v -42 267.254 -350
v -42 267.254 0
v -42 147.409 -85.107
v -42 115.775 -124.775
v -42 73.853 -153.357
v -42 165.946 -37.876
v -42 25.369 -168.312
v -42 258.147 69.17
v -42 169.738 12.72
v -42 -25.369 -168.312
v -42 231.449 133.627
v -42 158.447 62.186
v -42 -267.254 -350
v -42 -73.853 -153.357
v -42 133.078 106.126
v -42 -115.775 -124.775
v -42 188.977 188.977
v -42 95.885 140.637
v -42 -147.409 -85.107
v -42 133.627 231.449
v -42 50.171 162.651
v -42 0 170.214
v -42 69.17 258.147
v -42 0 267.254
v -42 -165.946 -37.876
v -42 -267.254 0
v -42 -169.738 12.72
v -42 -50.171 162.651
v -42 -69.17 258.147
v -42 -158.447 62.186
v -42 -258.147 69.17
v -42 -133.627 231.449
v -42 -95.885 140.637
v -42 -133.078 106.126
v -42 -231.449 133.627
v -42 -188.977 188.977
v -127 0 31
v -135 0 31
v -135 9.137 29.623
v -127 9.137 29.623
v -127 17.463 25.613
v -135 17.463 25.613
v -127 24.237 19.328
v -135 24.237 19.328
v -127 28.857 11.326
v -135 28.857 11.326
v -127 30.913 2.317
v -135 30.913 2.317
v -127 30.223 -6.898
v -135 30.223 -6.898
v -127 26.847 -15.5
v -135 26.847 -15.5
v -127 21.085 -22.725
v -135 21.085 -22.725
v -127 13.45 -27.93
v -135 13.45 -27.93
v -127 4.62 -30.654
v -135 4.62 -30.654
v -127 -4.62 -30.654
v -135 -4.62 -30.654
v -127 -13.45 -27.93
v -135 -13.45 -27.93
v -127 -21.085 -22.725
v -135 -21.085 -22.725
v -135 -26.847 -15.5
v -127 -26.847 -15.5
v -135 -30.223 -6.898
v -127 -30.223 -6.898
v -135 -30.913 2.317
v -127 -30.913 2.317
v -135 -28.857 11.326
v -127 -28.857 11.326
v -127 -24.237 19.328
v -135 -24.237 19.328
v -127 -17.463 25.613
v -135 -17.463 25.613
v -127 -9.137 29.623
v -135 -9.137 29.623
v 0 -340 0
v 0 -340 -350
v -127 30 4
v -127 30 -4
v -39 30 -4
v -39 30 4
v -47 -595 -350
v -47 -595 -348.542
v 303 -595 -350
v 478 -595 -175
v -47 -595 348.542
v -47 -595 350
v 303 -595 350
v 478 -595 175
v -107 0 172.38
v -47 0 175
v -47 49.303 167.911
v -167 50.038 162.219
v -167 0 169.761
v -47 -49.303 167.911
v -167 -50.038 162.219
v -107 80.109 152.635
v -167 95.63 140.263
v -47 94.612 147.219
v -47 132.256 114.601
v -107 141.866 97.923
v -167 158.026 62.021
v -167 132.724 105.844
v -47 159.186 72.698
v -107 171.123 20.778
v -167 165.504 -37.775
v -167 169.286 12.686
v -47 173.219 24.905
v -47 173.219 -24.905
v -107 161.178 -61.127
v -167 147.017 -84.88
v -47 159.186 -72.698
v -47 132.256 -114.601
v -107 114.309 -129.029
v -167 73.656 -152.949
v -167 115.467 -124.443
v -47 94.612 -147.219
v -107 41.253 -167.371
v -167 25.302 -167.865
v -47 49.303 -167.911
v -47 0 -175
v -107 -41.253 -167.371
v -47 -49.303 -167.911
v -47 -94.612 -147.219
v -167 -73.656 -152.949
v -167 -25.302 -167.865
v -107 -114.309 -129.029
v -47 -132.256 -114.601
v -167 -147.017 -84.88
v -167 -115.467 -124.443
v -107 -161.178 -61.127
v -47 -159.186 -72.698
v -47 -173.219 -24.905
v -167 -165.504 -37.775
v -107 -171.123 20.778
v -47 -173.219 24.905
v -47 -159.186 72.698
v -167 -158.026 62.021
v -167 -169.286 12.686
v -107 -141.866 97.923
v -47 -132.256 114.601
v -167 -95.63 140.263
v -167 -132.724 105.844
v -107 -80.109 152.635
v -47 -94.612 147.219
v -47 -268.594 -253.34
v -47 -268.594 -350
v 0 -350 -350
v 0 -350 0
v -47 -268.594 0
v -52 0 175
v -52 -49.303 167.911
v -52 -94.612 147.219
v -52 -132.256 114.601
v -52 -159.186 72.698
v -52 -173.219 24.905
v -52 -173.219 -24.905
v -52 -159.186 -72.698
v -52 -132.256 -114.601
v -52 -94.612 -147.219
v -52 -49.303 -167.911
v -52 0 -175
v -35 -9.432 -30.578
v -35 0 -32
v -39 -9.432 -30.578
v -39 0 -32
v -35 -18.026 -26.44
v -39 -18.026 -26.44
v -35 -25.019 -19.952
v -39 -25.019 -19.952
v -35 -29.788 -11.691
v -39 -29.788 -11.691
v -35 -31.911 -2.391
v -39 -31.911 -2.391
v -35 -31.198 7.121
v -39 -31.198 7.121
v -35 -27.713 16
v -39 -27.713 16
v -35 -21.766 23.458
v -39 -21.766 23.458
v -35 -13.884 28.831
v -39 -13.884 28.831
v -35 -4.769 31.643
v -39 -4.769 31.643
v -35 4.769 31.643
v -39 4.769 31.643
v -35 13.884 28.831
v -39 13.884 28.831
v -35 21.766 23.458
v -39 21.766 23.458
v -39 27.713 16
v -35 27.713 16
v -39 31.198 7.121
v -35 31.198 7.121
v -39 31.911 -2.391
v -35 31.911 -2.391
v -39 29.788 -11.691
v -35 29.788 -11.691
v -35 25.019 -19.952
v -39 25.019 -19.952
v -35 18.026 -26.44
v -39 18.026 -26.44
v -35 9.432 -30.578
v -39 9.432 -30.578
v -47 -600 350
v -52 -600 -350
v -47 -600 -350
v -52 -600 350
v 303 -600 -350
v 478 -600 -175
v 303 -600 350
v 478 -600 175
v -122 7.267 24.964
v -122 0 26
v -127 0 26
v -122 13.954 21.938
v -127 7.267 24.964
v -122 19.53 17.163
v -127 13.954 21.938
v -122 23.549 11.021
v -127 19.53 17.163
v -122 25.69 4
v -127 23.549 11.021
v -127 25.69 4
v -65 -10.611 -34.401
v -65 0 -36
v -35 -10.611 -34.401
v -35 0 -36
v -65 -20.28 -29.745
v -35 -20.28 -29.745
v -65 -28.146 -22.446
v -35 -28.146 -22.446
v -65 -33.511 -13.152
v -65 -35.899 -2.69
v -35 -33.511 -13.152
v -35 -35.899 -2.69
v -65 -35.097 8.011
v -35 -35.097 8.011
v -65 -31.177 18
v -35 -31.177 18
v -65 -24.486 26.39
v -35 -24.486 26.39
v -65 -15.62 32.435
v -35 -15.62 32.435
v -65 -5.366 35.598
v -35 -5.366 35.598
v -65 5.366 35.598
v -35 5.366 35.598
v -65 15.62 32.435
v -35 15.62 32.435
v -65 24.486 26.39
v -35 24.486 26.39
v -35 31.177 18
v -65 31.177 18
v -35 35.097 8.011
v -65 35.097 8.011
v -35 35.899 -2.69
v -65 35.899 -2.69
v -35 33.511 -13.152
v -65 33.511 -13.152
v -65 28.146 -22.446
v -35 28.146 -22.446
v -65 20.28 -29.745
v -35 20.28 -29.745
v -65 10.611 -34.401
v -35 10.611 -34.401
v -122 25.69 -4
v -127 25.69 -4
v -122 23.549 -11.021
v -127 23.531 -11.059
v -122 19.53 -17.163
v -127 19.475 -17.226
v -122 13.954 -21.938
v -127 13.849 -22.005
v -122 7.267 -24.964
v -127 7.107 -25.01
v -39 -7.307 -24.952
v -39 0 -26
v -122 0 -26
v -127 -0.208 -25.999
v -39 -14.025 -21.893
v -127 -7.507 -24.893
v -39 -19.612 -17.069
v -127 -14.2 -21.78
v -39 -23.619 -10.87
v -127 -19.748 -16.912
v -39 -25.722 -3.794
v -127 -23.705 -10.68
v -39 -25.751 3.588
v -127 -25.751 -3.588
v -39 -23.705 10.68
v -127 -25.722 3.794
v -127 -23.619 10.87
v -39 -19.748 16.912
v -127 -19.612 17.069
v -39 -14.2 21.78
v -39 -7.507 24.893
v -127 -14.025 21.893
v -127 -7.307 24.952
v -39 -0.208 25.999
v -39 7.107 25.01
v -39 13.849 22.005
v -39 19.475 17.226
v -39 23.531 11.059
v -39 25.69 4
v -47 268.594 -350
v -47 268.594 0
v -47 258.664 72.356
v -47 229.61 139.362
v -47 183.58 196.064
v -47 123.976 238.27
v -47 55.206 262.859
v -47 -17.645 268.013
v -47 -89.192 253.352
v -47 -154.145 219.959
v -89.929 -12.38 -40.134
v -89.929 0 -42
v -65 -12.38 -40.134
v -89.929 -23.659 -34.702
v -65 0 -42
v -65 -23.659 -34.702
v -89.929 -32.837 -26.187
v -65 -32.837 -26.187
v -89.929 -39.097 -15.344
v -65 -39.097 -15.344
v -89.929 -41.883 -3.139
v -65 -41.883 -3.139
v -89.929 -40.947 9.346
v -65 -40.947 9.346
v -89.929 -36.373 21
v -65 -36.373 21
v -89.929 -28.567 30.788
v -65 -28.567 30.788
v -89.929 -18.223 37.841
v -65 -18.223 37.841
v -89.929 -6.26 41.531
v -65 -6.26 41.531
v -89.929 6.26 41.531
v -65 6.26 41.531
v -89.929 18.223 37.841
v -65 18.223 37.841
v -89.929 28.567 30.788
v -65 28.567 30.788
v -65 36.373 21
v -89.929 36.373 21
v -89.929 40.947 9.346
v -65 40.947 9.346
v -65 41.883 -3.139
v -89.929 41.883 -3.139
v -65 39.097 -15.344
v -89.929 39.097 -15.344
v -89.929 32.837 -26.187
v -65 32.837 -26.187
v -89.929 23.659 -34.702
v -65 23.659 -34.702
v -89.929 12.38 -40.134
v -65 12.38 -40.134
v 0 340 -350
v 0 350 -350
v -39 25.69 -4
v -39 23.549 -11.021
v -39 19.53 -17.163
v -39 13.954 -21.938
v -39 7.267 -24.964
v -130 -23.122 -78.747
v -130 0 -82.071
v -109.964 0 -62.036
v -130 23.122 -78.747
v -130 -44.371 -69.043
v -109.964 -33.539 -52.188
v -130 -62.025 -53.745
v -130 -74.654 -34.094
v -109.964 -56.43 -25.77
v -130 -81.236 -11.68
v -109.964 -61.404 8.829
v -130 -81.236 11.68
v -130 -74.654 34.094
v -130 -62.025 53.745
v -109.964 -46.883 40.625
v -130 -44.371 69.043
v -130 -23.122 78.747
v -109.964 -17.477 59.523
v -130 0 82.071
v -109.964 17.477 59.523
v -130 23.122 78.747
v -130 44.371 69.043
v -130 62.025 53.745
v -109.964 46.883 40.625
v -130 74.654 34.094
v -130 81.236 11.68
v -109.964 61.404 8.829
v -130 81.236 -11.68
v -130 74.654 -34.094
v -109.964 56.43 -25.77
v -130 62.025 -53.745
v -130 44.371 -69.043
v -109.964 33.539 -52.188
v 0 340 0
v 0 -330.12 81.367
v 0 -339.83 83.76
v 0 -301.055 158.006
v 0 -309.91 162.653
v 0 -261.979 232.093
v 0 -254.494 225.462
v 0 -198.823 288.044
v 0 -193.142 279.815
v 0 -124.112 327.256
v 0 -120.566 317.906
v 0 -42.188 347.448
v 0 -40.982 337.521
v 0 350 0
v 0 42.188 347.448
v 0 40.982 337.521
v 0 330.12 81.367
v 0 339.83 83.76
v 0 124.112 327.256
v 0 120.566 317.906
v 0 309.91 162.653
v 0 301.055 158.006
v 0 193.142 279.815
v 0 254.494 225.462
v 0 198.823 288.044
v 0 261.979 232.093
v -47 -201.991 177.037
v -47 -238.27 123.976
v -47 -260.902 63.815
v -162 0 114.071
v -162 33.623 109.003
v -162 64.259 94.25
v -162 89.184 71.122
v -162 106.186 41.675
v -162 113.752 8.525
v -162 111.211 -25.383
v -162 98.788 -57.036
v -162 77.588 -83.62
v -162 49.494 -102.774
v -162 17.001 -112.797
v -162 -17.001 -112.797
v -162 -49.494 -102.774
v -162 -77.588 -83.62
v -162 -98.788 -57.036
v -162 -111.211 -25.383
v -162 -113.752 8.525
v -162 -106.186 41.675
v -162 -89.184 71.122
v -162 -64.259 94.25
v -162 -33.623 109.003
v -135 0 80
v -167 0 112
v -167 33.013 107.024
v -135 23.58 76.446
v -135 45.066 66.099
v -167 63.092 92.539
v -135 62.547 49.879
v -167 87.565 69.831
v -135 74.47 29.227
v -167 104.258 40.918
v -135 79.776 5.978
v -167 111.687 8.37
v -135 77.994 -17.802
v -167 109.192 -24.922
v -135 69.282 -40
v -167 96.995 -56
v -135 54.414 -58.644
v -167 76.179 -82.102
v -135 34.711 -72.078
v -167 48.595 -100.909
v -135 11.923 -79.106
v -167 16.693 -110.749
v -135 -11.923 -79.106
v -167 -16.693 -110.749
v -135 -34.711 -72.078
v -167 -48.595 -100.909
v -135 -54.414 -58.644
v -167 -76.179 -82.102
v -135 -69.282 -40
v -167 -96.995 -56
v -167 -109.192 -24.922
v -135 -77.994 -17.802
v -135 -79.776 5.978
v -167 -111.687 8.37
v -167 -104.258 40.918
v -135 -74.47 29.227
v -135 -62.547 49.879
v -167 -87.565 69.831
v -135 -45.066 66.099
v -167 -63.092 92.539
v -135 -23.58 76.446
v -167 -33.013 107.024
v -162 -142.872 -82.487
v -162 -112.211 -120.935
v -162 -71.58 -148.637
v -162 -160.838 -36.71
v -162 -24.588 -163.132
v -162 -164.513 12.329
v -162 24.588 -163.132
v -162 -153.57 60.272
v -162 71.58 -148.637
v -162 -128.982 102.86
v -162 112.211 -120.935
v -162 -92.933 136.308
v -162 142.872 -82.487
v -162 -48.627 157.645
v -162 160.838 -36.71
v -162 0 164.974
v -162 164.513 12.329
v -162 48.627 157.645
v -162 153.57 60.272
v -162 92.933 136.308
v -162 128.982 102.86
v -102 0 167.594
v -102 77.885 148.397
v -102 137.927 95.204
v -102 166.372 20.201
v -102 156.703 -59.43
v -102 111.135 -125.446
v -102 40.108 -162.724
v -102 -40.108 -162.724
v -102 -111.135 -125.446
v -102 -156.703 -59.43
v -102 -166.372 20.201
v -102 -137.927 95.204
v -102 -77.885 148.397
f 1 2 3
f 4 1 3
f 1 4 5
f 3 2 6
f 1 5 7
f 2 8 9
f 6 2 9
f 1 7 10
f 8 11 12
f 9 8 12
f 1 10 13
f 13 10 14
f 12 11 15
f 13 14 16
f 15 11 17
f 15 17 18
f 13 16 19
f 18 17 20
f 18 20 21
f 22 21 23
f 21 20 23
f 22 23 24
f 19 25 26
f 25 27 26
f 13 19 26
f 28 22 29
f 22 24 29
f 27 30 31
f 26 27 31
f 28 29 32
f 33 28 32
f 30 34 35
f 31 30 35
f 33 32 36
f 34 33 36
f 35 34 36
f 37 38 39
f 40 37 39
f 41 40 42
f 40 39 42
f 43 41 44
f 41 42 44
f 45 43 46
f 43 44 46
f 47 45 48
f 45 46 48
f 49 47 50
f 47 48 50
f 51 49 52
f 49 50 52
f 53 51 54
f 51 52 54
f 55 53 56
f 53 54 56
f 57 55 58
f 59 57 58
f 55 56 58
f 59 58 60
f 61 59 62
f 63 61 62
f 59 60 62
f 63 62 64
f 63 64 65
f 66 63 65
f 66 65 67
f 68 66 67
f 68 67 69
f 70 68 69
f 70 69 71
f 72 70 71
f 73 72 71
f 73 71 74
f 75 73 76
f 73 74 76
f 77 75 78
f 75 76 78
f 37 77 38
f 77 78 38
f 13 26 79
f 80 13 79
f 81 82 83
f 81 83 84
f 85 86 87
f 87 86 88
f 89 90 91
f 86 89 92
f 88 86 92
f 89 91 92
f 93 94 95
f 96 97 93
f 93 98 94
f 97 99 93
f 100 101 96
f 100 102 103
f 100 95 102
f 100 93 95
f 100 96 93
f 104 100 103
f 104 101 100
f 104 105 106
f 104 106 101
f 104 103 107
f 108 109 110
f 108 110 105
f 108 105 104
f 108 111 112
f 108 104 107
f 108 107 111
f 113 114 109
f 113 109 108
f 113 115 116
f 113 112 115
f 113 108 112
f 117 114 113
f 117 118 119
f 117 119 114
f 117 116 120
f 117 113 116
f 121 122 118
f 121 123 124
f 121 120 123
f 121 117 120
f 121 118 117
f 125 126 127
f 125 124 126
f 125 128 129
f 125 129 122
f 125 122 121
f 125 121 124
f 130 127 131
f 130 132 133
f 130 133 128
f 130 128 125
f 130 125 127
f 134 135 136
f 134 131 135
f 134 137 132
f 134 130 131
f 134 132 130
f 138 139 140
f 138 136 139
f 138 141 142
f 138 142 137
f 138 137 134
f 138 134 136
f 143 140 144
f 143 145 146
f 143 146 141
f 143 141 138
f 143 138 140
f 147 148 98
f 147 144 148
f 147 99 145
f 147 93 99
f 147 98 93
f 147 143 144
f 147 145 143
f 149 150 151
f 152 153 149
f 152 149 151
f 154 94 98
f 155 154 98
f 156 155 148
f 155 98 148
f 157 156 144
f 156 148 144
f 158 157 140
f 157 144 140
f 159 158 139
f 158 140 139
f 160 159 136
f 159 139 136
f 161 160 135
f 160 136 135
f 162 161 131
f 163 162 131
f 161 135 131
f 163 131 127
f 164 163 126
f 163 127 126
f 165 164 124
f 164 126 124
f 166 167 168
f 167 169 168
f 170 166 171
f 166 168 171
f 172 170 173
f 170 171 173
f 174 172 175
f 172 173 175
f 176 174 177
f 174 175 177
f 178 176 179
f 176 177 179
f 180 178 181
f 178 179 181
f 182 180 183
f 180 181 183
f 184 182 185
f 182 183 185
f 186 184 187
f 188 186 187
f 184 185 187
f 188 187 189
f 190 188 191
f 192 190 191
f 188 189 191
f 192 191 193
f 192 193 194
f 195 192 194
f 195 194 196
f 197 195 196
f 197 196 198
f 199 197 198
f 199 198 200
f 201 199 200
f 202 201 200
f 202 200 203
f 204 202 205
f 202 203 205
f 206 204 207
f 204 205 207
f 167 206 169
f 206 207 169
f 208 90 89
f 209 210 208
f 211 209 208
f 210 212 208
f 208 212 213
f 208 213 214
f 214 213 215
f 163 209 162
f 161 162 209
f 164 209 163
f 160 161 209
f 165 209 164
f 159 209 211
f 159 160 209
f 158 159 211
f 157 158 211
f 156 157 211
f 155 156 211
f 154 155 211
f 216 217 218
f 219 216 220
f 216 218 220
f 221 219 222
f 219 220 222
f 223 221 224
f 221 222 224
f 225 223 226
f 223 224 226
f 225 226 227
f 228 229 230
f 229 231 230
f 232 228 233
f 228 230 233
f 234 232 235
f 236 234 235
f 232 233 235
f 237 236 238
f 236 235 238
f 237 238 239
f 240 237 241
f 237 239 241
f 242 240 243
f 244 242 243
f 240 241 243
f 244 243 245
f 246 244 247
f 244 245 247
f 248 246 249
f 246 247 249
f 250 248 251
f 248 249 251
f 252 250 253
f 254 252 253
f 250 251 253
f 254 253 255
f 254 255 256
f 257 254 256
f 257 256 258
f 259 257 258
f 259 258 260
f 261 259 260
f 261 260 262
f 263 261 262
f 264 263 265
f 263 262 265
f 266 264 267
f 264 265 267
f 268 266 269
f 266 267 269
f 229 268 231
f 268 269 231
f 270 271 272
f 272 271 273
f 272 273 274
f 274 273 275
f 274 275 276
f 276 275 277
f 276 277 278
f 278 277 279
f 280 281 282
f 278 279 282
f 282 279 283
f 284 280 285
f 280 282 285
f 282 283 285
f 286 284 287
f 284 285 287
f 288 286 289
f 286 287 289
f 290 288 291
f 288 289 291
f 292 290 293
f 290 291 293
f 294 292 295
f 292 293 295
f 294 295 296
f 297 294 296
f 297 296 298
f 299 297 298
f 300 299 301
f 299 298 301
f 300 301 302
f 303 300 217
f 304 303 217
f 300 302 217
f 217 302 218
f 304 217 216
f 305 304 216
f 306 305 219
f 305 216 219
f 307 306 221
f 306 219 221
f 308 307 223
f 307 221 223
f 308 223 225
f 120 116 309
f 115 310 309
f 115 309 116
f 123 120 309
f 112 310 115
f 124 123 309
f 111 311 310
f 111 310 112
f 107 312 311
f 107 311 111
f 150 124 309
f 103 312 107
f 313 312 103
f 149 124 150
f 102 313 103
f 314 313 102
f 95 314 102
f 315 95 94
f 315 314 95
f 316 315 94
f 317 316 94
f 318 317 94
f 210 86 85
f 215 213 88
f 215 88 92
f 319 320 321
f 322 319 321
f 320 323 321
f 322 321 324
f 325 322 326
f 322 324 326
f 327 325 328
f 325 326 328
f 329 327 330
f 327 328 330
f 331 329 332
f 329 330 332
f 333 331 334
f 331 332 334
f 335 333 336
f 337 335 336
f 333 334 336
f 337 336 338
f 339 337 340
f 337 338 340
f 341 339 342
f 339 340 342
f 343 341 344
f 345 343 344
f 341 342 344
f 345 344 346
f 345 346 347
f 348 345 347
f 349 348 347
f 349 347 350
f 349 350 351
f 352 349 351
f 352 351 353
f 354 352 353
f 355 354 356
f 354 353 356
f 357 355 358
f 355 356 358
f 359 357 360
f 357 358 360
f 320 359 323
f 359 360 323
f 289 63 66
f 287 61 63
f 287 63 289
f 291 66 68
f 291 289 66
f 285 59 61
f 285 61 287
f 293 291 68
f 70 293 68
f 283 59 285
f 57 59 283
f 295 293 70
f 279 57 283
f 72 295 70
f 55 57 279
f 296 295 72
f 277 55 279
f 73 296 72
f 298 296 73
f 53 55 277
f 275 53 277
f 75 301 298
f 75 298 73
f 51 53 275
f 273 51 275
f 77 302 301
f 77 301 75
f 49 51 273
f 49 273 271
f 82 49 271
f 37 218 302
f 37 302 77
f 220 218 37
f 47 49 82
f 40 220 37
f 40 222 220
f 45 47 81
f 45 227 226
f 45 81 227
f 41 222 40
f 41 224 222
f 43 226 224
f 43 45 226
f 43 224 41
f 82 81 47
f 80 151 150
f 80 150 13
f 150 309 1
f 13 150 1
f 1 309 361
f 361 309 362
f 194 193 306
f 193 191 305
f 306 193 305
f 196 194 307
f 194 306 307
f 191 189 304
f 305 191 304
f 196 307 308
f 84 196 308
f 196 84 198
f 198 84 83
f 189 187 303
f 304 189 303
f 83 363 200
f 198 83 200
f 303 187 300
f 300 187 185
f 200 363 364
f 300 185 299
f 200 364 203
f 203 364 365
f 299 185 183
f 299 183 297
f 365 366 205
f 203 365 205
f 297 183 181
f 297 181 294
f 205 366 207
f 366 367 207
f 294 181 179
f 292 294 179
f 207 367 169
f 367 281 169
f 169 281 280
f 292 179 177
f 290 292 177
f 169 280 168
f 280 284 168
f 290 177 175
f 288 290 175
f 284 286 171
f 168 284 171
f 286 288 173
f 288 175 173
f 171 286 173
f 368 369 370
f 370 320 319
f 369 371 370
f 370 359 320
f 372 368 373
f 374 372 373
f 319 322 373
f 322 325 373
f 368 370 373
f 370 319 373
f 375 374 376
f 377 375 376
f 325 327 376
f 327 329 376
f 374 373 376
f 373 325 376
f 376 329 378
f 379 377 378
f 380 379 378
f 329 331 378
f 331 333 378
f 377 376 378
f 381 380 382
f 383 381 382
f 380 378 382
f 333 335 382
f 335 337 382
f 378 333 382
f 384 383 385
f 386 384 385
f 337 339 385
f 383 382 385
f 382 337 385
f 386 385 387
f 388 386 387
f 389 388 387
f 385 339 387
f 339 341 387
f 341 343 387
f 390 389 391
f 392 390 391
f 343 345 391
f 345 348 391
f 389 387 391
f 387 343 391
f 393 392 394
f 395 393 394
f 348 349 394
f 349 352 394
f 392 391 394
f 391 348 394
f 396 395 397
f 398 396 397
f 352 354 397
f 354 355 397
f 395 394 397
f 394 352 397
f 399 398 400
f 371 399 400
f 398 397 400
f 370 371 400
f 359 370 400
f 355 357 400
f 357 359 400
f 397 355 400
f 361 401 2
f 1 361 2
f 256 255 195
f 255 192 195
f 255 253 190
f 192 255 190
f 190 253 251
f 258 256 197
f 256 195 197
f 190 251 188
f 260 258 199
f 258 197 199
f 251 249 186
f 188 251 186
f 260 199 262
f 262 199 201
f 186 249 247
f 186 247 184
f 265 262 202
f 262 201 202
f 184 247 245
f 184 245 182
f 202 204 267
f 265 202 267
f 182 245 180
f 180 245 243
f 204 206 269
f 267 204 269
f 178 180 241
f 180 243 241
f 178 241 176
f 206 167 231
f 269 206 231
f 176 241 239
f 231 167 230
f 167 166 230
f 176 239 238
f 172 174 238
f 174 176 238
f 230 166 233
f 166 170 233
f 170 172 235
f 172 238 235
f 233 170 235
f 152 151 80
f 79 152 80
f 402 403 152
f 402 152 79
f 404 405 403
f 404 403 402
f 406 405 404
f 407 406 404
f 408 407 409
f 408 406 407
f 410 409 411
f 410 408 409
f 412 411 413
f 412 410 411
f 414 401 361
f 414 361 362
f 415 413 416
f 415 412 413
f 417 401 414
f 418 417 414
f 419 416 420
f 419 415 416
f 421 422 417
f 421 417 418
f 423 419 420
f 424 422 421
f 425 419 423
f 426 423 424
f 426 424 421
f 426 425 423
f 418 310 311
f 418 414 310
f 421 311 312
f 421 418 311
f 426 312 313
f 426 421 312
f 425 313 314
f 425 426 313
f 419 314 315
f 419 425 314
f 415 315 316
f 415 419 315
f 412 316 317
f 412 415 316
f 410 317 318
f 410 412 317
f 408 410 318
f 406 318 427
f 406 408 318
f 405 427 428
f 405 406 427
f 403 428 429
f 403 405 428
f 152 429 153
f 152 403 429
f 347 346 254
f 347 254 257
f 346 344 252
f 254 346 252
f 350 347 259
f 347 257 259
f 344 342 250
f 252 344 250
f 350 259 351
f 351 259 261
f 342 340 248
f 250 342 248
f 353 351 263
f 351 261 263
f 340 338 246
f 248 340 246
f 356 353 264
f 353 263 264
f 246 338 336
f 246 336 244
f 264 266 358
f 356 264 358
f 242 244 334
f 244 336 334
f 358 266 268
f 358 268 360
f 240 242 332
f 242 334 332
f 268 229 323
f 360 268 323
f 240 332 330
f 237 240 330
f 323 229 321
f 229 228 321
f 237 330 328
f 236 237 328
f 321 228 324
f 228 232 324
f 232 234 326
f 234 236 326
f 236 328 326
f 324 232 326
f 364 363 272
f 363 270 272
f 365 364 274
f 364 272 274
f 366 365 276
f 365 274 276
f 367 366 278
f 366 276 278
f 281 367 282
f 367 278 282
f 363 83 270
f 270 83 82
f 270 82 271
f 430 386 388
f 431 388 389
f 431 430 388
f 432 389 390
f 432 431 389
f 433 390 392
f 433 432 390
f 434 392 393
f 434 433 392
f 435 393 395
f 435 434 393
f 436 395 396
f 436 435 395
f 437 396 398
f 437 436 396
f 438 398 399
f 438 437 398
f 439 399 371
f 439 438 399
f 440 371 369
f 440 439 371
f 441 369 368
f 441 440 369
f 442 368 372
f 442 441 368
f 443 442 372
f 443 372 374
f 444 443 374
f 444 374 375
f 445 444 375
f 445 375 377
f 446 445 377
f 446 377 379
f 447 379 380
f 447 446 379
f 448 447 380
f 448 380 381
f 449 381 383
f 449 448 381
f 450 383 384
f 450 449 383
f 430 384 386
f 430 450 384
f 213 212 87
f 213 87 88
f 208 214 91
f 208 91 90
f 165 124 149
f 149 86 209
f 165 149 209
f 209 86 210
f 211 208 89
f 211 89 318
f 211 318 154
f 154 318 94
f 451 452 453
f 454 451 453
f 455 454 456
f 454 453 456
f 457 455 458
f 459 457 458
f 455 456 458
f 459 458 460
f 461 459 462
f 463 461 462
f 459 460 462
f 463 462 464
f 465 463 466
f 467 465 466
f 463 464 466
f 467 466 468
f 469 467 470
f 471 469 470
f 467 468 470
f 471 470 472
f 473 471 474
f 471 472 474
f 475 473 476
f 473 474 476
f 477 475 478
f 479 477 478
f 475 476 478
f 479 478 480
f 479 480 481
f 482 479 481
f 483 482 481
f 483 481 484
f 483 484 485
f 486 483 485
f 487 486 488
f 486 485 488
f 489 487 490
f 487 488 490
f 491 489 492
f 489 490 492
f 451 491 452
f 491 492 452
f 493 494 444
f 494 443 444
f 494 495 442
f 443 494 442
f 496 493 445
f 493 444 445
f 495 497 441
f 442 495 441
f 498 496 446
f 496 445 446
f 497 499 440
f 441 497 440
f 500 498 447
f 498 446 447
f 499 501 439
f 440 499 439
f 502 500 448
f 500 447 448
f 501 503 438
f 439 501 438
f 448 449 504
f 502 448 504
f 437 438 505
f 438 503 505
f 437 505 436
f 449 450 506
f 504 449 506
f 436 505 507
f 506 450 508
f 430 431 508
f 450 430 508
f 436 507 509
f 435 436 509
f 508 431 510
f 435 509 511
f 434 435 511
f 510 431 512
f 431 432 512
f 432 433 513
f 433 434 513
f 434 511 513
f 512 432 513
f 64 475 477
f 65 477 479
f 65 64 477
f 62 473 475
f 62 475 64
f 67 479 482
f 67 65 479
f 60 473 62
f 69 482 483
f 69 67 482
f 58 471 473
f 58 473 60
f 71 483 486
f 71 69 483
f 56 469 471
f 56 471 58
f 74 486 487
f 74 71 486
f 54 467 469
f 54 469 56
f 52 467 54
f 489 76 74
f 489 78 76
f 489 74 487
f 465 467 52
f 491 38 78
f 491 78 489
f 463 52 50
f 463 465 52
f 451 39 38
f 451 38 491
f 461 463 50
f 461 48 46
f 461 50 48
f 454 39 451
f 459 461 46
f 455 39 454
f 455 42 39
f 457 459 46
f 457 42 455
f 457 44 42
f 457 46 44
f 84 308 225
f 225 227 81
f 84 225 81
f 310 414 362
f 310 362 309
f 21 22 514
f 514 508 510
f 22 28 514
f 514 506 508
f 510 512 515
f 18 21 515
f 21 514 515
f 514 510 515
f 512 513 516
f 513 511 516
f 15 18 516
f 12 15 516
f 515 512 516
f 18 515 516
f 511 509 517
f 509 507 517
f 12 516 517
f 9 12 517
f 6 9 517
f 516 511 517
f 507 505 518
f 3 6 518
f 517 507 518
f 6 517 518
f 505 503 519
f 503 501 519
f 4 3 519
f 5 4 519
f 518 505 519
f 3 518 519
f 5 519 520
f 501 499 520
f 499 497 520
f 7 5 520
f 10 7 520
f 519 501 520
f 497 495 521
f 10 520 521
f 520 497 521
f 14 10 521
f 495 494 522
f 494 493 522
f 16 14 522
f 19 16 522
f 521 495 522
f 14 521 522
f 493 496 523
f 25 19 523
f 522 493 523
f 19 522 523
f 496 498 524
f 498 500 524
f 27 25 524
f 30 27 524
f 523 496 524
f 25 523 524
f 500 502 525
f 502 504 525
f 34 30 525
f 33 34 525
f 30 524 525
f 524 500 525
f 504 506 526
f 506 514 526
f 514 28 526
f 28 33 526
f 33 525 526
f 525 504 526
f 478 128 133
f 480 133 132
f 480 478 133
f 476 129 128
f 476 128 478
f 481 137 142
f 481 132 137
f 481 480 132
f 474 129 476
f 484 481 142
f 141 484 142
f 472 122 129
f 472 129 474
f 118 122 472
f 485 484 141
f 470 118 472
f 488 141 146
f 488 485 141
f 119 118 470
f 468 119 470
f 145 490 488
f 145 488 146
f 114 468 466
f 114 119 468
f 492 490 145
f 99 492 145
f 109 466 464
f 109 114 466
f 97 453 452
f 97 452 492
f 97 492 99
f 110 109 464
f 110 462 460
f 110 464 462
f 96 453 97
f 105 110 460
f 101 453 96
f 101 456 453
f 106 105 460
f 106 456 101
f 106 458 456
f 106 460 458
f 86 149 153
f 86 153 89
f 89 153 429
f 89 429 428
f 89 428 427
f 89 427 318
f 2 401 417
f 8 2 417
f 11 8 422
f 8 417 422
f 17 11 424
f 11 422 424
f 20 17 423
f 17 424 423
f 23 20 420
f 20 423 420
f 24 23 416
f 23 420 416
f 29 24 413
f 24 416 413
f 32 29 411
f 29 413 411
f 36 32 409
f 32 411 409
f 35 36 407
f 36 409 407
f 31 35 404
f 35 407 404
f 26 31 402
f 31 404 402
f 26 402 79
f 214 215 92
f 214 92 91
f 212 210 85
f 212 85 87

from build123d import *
from build123d.topology import SkipClean

# Parameters (mm, degrees)
REVOLVE1_ANGLE          = 180
SKETCH12_R              = 175
BOSS_EXTRUDE2_DEPTH     = 120
BOSS_EXTRUDE2_TAPER     = 2.5
BOSS_EXTRUDE3_DEPTH     = 350
SKETCH14_R              = 112
CUT_EXTRUDE1_DEPTH      = 32
CUT_EXTRUDE1_DRAFT      = -45
SKETCH17_R              = 31
CUT_EXTRUDE3_DEPTH      = 8
SHELL1_T                = -5
SKETCH15_R              = 26
CUT_EXTRUDE2_DEPTH      = 514.054577993
BOSS_EXTRUDE4_DEPTH     = 5
BOSS_EXTRUDE5_DEPTH     = 5
ENL_V_MAT_EXTRU_2_REACH = 923.154


with BuildPart() as part:
    # Esquisse2 → Revolve1 (revolve)
    with BuildSketch(Plane.XY):
        Polygon((0, 350), (0, 0), (-47, 0), (-47, 268.593612044), align=None)
    revolve(axis=Axis((-47, 0, 0), (1, 0, 0)), revolution_arc=REVOLVE1_ANGLE)

    # Sketch12 → Boss-Extrude2 (add)
    with BuildSketch(Plane.ZY.offset(47)):
        Circle(SKETCH12_R)
    extrude(amount=BOSS_EXTRUDE2_DEPTH, taper=BOSS_EXTRUDE2_TAPER)

    # Sketch13 → Boss-Extrude3 (add)
    with BuildSketch(Plane(origin=(0, 0, 0), x_dir=(-1, 0, 0), z_dir=(0, 0, -1))):
        Polygon((0, 350), (47, 268.593612044), (47, -268.593612044), (0, -350), align=None)
    extrude(amount=BOSS_EXTRUDE3_DEPTH)


with BuildPart() as cut_extrude1_tool:
    # Sketch14 → Cut-Extrude1 (with draft: the straight prism first)
    with BuildSketch(Plane.ZY.offset(167)):
        Circle(SKETCH14_R)
    extrude(amount=-CUT_EXTRUDE1_DEPTH)
    # Cut-Extrude1: the draft: its side faces are tilted about the plane it starts from
    cut_extrude1_sides = [cut_extrude1_tool.faces().sort_by_distance(p)[0] for p in [
        (-151, 0, -112),
    ]]
    draft(cut_extrude1_sides, Plane.ZY.offset(167), CUT_EXTRUDE1_DRAFT)


with BuildPart() as part_1:
    add(part.part)

    # Cut-Extrude1: cut by cut_extrude1_tool
    add(cut_extrude1_tool.part, mode=Mode.SUBTRACT)

    # Sketch17 → Cut-Extrude3 (cut)
    with BuildSketch(Plane.ZY.offset(135)):
        Circle(SKETCH17_R)
    extrude(amount=-CUT_EXTRUDE3_DEPTH, mode=Mode.SUBTRACT)

    # Shell1
    shell1_openings = [part_1.faces().sort_by_distance(p)[0] for p in [
        (-22.469140062, 0, -350),
        (0, 0, -32.672450622),
    ]]
    offset(amount=SHELL1_T, openings=shell1_openings, kind=Kind.INTERSECTION)

    # Sketch15 → Cut-Extrude2 (cut, through all)
    with BuildSketch(Plane.ZY.offset(135)):
        Circle(SKETCH15_R)
    extrude(amount=-CUT_EXTRUDE2_DEPTH, mode=Mode.SUBTRACT)

    # Sketch18 → Revolve2 (revolve)
    with SkipClean():  # the faces are left unmerged after this step: merging them gives an invalid solid
        with BuildSketch(Plane.XY, mode=Mode.PRIVATE) as revolve2_sk:
            Polygon((-130, 82.071067812), (-89.928932188, 42), (-65, 42), (-65, 36), (-35, 36), (-35, 32), (-39, 32), (-39, 26), (-122, 26), (-122, 36), (-130, 36), align=None)
        revolve(revolve2_sk.sketch.rotate(Axis((0, 0, 0), (-1, 0, 0)), 90), axis=Axis((0, 0, 0), (-1, 0, 0)))

    # Sketch20 → Boss-Extrude4 (add)
    with SkipClean():  # the faces are left unmerged after this step: merging them gives an invalid solid
        with BuildSketch(Plane.ZY.offset(47)):
            with BuildLine():
                Line((-350, -600), (350, -600))
                Line((350, -600), (175, 0))
                ThreePointArc((175, 0), (0, -175), (-175, 0))
                Line((-175, 0), (-350, -600))
            make_face()
        extrude(amount=BOSS_EXTRUDE4_DEPTH)

    # Sketch21 → Boss-Extrude5 (add)
    with SkipClean():  # the faces are left unmerged after this step: merging them gives an invalid solid
        with BuildSketch(Plane.XZ.offset(600)):
            Polygon((-47, 350), (-47, -350), (303, -350), (478, -175), (478, 175), (303, 350), align=None)
        extrude(amount=-BOSS_EXTRUDE5_DEPTH)

    # Esquisse3 → Enlèv. mat.-Extru.2 (cut, up to next)
    with BuildSketch(Plane.ZY.offset(127), mode=Mode.PRIVATE) as enl_v_mat_extru_2_sk1:
        Polygon((-4, 30), (4, 30), (4, 26), (4, 25), (-4, 25), (-4, 26), align=None)
    enl_v_mat_extru_2_tool1 = extrude(enl_v_mat_extru_2_sk1.sketch, amount=-ENL_V_MAT_EXTRU_2_REACH, mode=Mode.PRIVATE) & part_1.part
    add(enl_v_mat_extru_2_tool1.solids().sort_by_distance((-127, 27.5, 0))[0], mode=Mode.SUBTRACT)


solid = part_1.part
